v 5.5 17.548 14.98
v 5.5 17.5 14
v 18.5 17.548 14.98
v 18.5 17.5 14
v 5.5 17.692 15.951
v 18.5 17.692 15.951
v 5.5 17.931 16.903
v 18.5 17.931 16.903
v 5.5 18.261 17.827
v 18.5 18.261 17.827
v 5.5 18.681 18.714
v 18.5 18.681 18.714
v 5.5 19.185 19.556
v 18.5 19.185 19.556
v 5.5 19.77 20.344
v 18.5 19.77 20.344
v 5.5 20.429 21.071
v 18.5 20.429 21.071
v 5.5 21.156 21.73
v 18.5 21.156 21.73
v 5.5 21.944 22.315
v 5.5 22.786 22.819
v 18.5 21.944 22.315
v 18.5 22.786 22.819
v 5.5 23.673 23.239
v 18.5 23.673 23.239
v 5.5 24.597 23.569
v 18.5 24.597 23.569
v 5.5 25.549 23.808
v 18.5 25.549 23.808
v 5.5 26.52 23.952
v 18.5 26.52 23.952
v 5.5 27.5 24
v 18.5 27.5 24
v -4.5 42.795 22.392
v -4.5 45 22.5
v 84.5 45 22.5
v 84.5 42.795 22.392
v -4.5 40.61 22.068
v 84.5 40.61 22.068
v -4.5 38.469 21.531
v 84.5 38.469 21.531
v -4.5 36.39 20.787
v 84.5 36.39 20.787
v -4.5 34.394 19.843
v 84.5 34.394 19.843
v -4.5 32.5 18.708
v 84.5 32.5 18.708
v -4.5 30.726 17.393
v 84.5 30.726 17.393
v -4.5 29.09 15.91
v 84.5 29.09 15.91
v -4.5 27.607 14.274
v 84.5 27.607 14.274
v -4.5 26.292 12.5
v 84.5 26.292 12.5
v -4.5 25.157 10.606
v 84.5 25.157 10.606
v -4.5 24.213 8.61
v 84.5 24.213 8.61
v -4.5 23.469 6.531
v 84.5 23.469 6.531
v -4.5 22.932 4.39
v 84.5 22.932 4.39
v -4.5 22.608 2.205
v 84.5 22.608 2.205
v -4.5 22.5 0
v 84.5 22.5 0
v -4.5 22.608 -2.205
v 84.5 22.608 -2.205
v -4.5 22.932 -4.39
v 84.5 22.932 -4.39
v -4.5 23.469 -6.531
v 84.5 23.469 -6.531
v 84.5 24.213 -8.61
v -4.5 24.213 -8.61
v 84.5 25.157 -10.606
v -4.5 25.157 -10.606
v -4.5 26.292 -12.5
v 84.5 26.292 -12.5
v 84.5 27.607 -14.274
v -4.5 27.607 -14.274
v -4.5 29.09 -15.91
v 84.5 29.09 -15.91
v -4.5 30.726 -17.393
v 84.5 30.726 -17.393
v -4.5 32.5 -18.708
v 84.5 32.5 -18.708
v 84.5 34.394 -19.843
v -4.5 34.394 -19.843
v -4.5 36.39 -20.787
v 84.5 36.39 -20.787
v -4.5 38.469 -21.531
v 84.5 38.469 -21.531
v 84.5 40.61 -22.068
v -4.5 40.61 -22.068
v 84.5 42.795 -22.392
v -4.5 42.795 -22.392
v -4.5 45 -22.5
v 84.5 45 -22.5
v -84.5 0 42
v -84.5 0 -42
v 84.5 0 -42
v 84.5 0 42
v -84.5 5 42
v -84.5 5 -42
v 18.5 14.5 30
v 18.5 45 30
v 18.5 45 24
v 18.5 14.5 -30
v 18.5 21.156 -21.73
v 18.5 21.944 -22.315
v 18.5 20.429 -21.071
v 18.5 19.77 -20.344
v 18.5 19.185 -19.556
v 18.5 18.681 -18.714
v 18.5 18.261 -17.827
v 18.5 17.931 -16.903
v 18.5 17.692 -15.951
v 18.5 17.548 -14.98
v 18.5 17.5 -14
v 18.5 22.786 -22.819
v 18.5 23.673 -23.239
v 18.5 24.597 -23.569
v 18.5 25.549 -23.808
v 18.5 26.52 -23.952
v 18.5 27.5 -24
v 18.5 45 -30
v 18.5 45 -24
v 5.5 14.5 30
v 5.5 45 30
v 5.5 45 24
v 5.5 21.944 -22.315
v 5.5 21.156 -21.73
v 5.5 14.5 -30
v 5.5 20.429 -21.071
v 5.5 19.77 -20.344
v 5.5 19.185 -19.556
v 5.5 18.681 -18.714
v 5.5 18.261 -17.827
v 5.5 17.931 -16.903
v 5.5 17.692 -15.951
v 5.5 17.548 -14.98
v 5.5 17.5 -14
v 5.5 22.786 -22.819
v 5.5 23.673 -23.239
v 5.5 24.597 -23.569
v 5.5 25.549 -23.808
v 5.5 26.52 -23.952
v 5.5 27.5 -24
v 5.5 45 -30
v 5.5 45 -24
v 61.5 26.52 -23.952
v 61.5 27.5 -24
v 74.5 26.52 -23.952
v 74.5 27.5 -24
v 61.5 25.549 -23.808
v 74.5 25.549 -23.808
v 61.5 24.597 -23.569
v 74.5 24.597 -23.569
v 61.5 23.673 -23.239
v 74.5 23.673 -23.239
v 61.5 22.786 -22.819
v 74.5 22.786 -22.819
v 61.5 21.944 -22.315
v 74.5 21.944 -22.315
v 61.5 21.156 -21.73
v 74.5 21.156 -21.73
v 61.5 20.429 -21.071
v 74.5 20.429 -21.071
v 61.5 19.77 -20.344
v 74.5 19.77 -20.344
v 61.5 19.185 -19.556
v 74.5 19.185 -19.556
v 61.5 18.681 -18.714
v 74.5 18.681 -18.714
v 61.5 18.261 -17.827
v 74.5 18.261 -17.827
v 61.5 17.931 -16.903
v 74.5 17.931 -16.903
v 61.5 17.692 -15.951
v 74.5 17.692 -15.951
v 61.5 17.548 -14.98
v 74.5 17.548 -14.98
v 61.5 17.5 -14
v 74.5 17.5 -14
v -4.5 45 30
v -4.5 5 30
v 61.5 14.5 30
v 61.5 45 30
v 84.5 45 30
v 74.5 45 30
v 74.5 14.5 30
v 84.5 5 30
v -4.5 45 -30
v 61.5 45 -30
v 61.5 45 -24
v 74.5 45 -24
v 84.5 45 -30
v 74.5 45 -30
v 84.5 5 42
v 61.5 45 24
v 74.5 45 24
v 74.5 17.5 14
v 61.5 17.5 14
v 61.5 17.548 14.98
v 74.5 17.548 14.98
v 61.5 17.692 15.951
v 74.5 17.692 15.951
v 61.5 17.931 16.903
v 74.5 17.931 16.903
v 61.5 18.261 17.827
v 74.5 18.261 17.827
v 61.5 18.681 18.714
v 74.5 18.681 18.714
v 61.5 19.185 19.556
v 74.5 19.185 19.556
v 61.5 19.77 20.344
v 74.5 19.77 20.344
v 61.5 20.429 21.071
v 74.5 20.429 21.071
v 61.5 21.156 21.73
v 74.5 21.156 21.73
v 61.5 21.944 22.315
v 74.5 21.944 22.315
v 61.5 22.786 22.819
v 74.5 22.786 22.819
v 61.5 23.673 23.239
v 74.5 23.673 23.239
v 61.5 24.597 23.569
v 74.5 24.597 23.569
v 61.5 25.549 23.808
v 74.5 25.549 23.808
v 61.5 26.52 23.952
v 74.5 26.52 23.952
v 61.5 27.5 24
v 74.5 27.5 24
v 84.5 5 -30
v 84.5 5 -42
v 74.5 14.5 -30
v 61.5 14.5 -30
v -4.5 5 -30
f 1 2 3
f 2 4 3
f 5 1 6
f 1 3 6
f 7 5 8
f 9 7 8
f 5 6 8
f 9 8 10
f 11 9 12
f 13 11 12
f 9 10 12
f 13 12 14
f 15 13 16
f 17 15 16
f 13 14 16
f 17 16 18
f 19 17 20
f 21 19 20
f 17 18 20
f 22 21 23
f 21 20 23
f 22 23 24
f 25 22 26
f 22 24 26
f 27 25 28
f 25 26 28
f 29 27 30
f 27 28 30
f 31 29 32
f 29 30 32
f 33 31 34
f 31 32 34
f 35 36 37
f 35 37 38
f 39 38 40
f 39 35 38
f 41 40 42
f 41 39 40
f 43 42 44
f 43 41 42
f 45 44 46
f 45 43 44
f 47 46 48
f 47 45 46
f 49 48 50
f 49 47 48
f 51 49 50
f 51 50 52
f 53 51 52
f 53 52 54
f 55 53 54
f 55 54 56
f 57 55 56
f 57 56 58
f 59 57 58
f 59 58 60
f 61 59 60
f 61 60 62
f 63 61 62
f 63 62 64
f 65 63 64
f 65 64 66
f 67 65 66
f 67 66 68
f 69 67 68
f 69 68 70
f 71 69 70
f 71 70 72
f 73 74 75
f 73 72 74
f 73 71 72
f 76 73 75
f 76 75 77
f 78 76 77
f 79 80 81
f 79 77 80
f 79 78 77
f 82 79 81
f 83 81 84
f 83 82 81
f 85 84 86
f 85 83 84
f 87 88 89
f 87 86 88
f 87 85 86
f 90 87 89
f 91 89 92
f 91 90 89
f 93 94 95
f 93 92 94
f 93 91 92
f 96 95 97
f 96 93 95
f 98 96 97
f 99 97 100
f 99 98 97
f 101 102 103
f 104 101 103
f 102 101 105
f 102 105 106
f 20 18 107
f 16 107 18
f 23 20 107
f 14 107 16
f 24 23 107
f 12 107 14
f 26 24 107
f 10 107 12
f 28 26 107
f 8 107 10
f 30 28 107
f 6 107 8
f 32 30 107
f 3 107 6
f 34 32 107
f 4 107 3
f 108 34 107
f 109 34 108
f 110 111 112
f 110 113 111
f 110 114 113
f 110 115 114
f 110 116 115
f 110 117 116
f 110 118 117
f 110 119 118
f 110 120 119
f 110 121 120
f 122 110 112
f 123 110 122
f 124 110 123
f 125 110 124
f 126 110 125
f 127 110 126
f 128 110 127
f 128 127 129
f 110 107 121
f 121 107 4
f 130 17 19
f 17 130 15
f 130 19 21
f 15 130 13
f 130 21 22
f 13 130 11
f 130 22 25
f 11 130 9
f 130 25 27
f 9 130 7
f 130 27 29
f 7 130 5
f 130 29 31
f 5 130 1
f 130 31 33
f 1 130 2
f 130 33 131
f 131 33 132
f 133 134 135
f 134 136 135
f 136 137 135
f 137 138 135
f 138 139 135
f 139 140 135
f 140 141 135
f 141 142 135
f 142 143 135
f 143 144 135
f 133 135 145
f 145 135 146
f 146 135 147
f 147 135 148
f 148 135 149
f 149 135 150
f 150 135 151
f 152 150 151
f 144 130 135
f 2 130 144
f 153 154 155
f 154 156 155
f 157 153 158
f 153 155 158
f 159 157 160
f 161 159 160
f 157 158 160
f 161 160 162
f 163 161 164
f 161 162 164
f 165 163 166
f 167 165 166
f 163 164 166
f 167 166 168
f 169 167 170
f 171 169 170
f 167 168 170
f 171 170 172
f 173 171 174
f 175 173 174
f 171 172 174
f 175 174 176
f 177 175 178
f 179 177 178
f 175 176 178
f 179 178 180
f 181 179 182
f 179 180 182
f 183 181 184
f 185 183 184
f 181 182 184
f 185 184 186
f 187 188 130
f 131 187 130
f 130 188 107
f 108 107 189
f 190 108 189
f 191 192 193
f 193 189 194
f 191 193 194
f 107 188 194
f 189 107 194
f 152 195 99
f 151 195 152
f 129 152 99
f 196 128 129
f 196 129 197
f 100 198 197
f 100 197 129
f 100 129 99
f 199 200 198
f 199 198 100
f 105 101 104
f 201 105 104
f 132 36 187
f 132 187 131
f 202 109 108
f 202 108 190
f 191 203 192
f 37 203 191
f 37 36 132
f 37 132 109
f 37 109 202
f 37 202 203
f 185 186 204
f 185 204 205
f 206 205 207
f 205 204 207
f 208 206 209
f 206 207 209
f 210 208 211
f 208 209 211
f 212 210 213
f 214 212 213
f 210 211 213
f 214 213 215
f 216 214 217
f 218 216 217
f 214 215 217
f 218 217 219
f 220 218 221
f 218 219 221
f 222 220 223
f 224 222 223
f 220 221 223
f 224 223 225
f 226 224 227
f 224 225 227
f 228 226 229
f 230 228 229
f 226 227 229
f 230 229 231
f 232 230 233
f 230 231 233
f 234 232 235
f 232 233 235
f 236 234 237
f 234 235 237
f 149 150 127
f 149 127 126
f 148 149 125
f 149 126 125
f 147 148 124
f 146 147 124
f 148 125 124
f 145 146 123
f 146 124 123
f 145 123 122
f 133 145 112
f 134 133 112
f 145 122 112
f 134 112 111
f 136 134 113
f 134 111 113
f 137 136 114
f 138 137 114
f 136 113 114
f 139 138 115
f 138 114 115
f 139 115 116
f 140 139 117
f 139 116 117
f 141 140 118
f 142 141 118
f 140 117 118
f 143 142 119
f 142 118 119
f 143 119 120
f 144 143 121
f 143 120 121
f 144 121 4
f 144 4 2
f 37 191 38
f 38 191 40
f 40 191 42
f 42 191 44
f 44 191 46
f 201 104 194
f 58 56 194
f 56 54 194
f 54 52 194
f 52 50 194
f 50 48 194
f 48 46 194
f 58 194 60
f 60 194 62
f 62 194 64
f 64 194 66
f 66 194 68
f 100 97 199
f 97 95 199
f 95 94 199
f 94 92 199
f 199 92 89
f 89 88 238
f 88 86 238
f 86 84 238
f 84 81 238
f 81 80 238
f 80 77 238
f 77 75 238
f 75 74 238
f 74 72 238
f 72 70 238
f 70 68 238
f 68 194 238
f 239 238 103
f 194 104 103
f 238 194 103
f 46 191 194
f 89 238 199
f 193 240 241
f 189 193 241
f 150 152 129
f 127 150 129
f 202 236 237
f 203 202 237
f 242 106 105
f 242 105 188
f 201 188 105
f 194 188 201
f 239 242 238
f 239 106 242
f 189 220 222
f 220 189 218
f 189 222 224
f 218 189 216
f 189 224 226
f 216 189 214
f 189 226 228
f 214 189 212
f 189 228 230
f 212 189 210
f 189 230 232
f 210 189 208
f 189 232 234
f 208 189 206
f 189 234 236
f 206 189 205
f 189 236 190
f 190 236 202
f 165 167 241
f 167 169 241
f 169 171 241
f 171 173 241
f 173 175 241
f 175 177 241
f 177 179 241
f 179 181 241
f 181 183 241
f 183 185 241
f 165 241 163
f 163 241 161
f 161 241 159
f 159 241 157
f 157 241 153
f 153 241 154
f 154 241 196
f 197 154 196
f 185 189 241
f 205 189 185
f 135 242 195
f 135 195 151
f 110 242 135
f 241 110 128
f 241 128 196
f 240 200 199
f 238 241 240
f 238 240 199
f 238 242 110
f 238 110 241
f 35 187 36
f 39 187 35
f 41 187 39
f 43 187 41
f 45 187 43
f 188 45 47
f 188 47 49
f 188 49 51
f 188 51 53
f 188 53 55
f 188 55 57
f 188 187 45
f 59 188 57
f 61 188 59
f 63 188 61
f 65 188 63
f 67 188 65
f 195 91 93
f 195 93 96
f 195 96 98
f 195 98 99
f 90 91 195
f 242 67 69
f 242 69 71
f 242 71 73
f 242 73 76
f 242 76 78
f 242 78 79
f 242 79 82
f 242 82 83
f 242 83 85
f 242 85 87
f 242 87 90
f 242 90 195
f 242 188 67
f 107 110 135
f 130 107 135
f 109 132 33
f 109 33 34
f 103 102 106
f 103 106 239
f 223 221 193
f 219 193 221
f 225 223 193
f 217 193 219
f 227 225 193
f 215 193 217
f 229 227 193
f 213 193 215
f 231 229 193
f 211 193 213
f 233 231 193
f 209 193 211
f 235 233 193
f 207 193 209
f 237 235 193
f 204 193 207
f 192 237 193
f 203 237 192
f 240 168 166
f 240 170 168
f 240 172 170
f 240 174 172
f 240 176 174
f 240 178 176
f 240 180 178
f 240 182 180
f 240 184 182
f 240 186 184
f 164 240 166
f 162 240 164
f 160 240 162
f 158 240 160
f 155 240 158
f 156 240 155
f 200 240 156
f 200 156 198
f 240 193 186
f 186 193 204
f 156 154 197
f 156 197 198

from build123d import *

# Parameters (mm, degrees)
SKETCH1_W            = 169
SKETCH1_H            = 84
BOSS_EXTRUDE1_DEPTH  = 5
SKETCH2_W            = 89
SKETCH2_H            = 60
BOSS_EXTRUDE2_DEPTH  = 40
CUT_EXTRUDE1_DEPTH   = 109.212753407
SKETCH4_W            = 13
SKETCH4_H            = 3
CUT_EXTRUDE2_DEPTH   = 120.788355027
SKETCH6_W            = 13
SKETCH6_H            = 27.5
CUT_EXTRUDE5_DEPTH   = 6
FILLET1_R            = 10
FILLET1_OF_MIRROR1_R = 10


with BuildPart() as part:
    # Sketch1 → Boss-Extrude1 (new body)
    with BuildSketch(Plane(origin=(0, 0, 0), x_dir=(1, 0, 0), z_dir=(0, 1, 0))):
        Rectangle(SKETCH1_W, SKETCH1_H)
    extrude(amount=BOSS_EXTRUDE1_DEPTH)

    # Sketch2 → Boss-Extrude2 (add)
    with BuildSketch(Plane(origin=(0, 5, 0), x_dir=(1, 0, 0), z_dir=(0, 1, 0))):
        with Locations((40, 0)):
            Rectangle(SKETCH2_W, SKETCH2_H)
    extrude(amount=BOSS_EXTRUDE2_DEPTH)

    # Sketch3 → Cut-Extrude1 (cut, through all)
    with BuildSketch(Plane.ZY.offset(4.5)):
        with BuildLine():
            Line((-22.5, 45), (22.5, 45))
            ThreePointArc((22.5, 45), (0, 22.5), (-22.5, 45))
        make_face()
    extrude(amount=-CUT_EXTRUDE1_DEPTH, mode=Mode.SUBTRACT)

    # Sketch4 → Cut-Extrude2 (cut, through all)
    with BuildSketch(Plane(origin=(0, 0, -30), x_dir=(-1, 0, 0), z_dir=(0, 0, -1))):
        with Locations((-12, 16)):
            Rectangle(SKETCH4_W, SKETCH4_H)
        with Locations((-68, 16)):
            Rectangle(SKETCH4_W, SKETCH4_H)
    extrude(amount=-CUT_EXTRUDE2_DEPTH, mode=Mode.SUBTRACT)

    # Sketch6 → Cut-Extrude5 (cut)
    with BuildSketch(Plane.XY.offset(30)):
        with Locations((12, 31.25)):
            Rectangle(SKETCH6_W, SKETCH6_H)
        with Locations((68, 31.25)):
            Rectangle(SKETCH6_W, SKETCH6_H)
    cut_extrude5 = extrude(amount=-CUT_EXTRUDE5_DEPTH, mode=Mode.SUBTRACT)

    # Fillet1
    fillet1_edges = [part.edges().sort_by_distance(p)[0] for p in [
        (12, 17.5, 24),
        (68, 17.5, 24),
    ]]
    fillet(fillet1_edges, radius=FILLET1_R)

    # Mirror1: Cut-Extrude5 across plane
    add(cut_extrude5.mirror(Plane.XY), mode=Mode.SUBTRACT)

    # Fillet1 of Mirror1
    fillet1_of_mirror1_edges = [part.edges().sort_by_distance(p)[0] for p in [
        (12, 17.5, -24),
        (68, 17.5, -24),
    ]]
    fillet(fillet1_of_mirror1_edges, radius=FILLET1_OF_MIRROR1_R)


solid = part.part
